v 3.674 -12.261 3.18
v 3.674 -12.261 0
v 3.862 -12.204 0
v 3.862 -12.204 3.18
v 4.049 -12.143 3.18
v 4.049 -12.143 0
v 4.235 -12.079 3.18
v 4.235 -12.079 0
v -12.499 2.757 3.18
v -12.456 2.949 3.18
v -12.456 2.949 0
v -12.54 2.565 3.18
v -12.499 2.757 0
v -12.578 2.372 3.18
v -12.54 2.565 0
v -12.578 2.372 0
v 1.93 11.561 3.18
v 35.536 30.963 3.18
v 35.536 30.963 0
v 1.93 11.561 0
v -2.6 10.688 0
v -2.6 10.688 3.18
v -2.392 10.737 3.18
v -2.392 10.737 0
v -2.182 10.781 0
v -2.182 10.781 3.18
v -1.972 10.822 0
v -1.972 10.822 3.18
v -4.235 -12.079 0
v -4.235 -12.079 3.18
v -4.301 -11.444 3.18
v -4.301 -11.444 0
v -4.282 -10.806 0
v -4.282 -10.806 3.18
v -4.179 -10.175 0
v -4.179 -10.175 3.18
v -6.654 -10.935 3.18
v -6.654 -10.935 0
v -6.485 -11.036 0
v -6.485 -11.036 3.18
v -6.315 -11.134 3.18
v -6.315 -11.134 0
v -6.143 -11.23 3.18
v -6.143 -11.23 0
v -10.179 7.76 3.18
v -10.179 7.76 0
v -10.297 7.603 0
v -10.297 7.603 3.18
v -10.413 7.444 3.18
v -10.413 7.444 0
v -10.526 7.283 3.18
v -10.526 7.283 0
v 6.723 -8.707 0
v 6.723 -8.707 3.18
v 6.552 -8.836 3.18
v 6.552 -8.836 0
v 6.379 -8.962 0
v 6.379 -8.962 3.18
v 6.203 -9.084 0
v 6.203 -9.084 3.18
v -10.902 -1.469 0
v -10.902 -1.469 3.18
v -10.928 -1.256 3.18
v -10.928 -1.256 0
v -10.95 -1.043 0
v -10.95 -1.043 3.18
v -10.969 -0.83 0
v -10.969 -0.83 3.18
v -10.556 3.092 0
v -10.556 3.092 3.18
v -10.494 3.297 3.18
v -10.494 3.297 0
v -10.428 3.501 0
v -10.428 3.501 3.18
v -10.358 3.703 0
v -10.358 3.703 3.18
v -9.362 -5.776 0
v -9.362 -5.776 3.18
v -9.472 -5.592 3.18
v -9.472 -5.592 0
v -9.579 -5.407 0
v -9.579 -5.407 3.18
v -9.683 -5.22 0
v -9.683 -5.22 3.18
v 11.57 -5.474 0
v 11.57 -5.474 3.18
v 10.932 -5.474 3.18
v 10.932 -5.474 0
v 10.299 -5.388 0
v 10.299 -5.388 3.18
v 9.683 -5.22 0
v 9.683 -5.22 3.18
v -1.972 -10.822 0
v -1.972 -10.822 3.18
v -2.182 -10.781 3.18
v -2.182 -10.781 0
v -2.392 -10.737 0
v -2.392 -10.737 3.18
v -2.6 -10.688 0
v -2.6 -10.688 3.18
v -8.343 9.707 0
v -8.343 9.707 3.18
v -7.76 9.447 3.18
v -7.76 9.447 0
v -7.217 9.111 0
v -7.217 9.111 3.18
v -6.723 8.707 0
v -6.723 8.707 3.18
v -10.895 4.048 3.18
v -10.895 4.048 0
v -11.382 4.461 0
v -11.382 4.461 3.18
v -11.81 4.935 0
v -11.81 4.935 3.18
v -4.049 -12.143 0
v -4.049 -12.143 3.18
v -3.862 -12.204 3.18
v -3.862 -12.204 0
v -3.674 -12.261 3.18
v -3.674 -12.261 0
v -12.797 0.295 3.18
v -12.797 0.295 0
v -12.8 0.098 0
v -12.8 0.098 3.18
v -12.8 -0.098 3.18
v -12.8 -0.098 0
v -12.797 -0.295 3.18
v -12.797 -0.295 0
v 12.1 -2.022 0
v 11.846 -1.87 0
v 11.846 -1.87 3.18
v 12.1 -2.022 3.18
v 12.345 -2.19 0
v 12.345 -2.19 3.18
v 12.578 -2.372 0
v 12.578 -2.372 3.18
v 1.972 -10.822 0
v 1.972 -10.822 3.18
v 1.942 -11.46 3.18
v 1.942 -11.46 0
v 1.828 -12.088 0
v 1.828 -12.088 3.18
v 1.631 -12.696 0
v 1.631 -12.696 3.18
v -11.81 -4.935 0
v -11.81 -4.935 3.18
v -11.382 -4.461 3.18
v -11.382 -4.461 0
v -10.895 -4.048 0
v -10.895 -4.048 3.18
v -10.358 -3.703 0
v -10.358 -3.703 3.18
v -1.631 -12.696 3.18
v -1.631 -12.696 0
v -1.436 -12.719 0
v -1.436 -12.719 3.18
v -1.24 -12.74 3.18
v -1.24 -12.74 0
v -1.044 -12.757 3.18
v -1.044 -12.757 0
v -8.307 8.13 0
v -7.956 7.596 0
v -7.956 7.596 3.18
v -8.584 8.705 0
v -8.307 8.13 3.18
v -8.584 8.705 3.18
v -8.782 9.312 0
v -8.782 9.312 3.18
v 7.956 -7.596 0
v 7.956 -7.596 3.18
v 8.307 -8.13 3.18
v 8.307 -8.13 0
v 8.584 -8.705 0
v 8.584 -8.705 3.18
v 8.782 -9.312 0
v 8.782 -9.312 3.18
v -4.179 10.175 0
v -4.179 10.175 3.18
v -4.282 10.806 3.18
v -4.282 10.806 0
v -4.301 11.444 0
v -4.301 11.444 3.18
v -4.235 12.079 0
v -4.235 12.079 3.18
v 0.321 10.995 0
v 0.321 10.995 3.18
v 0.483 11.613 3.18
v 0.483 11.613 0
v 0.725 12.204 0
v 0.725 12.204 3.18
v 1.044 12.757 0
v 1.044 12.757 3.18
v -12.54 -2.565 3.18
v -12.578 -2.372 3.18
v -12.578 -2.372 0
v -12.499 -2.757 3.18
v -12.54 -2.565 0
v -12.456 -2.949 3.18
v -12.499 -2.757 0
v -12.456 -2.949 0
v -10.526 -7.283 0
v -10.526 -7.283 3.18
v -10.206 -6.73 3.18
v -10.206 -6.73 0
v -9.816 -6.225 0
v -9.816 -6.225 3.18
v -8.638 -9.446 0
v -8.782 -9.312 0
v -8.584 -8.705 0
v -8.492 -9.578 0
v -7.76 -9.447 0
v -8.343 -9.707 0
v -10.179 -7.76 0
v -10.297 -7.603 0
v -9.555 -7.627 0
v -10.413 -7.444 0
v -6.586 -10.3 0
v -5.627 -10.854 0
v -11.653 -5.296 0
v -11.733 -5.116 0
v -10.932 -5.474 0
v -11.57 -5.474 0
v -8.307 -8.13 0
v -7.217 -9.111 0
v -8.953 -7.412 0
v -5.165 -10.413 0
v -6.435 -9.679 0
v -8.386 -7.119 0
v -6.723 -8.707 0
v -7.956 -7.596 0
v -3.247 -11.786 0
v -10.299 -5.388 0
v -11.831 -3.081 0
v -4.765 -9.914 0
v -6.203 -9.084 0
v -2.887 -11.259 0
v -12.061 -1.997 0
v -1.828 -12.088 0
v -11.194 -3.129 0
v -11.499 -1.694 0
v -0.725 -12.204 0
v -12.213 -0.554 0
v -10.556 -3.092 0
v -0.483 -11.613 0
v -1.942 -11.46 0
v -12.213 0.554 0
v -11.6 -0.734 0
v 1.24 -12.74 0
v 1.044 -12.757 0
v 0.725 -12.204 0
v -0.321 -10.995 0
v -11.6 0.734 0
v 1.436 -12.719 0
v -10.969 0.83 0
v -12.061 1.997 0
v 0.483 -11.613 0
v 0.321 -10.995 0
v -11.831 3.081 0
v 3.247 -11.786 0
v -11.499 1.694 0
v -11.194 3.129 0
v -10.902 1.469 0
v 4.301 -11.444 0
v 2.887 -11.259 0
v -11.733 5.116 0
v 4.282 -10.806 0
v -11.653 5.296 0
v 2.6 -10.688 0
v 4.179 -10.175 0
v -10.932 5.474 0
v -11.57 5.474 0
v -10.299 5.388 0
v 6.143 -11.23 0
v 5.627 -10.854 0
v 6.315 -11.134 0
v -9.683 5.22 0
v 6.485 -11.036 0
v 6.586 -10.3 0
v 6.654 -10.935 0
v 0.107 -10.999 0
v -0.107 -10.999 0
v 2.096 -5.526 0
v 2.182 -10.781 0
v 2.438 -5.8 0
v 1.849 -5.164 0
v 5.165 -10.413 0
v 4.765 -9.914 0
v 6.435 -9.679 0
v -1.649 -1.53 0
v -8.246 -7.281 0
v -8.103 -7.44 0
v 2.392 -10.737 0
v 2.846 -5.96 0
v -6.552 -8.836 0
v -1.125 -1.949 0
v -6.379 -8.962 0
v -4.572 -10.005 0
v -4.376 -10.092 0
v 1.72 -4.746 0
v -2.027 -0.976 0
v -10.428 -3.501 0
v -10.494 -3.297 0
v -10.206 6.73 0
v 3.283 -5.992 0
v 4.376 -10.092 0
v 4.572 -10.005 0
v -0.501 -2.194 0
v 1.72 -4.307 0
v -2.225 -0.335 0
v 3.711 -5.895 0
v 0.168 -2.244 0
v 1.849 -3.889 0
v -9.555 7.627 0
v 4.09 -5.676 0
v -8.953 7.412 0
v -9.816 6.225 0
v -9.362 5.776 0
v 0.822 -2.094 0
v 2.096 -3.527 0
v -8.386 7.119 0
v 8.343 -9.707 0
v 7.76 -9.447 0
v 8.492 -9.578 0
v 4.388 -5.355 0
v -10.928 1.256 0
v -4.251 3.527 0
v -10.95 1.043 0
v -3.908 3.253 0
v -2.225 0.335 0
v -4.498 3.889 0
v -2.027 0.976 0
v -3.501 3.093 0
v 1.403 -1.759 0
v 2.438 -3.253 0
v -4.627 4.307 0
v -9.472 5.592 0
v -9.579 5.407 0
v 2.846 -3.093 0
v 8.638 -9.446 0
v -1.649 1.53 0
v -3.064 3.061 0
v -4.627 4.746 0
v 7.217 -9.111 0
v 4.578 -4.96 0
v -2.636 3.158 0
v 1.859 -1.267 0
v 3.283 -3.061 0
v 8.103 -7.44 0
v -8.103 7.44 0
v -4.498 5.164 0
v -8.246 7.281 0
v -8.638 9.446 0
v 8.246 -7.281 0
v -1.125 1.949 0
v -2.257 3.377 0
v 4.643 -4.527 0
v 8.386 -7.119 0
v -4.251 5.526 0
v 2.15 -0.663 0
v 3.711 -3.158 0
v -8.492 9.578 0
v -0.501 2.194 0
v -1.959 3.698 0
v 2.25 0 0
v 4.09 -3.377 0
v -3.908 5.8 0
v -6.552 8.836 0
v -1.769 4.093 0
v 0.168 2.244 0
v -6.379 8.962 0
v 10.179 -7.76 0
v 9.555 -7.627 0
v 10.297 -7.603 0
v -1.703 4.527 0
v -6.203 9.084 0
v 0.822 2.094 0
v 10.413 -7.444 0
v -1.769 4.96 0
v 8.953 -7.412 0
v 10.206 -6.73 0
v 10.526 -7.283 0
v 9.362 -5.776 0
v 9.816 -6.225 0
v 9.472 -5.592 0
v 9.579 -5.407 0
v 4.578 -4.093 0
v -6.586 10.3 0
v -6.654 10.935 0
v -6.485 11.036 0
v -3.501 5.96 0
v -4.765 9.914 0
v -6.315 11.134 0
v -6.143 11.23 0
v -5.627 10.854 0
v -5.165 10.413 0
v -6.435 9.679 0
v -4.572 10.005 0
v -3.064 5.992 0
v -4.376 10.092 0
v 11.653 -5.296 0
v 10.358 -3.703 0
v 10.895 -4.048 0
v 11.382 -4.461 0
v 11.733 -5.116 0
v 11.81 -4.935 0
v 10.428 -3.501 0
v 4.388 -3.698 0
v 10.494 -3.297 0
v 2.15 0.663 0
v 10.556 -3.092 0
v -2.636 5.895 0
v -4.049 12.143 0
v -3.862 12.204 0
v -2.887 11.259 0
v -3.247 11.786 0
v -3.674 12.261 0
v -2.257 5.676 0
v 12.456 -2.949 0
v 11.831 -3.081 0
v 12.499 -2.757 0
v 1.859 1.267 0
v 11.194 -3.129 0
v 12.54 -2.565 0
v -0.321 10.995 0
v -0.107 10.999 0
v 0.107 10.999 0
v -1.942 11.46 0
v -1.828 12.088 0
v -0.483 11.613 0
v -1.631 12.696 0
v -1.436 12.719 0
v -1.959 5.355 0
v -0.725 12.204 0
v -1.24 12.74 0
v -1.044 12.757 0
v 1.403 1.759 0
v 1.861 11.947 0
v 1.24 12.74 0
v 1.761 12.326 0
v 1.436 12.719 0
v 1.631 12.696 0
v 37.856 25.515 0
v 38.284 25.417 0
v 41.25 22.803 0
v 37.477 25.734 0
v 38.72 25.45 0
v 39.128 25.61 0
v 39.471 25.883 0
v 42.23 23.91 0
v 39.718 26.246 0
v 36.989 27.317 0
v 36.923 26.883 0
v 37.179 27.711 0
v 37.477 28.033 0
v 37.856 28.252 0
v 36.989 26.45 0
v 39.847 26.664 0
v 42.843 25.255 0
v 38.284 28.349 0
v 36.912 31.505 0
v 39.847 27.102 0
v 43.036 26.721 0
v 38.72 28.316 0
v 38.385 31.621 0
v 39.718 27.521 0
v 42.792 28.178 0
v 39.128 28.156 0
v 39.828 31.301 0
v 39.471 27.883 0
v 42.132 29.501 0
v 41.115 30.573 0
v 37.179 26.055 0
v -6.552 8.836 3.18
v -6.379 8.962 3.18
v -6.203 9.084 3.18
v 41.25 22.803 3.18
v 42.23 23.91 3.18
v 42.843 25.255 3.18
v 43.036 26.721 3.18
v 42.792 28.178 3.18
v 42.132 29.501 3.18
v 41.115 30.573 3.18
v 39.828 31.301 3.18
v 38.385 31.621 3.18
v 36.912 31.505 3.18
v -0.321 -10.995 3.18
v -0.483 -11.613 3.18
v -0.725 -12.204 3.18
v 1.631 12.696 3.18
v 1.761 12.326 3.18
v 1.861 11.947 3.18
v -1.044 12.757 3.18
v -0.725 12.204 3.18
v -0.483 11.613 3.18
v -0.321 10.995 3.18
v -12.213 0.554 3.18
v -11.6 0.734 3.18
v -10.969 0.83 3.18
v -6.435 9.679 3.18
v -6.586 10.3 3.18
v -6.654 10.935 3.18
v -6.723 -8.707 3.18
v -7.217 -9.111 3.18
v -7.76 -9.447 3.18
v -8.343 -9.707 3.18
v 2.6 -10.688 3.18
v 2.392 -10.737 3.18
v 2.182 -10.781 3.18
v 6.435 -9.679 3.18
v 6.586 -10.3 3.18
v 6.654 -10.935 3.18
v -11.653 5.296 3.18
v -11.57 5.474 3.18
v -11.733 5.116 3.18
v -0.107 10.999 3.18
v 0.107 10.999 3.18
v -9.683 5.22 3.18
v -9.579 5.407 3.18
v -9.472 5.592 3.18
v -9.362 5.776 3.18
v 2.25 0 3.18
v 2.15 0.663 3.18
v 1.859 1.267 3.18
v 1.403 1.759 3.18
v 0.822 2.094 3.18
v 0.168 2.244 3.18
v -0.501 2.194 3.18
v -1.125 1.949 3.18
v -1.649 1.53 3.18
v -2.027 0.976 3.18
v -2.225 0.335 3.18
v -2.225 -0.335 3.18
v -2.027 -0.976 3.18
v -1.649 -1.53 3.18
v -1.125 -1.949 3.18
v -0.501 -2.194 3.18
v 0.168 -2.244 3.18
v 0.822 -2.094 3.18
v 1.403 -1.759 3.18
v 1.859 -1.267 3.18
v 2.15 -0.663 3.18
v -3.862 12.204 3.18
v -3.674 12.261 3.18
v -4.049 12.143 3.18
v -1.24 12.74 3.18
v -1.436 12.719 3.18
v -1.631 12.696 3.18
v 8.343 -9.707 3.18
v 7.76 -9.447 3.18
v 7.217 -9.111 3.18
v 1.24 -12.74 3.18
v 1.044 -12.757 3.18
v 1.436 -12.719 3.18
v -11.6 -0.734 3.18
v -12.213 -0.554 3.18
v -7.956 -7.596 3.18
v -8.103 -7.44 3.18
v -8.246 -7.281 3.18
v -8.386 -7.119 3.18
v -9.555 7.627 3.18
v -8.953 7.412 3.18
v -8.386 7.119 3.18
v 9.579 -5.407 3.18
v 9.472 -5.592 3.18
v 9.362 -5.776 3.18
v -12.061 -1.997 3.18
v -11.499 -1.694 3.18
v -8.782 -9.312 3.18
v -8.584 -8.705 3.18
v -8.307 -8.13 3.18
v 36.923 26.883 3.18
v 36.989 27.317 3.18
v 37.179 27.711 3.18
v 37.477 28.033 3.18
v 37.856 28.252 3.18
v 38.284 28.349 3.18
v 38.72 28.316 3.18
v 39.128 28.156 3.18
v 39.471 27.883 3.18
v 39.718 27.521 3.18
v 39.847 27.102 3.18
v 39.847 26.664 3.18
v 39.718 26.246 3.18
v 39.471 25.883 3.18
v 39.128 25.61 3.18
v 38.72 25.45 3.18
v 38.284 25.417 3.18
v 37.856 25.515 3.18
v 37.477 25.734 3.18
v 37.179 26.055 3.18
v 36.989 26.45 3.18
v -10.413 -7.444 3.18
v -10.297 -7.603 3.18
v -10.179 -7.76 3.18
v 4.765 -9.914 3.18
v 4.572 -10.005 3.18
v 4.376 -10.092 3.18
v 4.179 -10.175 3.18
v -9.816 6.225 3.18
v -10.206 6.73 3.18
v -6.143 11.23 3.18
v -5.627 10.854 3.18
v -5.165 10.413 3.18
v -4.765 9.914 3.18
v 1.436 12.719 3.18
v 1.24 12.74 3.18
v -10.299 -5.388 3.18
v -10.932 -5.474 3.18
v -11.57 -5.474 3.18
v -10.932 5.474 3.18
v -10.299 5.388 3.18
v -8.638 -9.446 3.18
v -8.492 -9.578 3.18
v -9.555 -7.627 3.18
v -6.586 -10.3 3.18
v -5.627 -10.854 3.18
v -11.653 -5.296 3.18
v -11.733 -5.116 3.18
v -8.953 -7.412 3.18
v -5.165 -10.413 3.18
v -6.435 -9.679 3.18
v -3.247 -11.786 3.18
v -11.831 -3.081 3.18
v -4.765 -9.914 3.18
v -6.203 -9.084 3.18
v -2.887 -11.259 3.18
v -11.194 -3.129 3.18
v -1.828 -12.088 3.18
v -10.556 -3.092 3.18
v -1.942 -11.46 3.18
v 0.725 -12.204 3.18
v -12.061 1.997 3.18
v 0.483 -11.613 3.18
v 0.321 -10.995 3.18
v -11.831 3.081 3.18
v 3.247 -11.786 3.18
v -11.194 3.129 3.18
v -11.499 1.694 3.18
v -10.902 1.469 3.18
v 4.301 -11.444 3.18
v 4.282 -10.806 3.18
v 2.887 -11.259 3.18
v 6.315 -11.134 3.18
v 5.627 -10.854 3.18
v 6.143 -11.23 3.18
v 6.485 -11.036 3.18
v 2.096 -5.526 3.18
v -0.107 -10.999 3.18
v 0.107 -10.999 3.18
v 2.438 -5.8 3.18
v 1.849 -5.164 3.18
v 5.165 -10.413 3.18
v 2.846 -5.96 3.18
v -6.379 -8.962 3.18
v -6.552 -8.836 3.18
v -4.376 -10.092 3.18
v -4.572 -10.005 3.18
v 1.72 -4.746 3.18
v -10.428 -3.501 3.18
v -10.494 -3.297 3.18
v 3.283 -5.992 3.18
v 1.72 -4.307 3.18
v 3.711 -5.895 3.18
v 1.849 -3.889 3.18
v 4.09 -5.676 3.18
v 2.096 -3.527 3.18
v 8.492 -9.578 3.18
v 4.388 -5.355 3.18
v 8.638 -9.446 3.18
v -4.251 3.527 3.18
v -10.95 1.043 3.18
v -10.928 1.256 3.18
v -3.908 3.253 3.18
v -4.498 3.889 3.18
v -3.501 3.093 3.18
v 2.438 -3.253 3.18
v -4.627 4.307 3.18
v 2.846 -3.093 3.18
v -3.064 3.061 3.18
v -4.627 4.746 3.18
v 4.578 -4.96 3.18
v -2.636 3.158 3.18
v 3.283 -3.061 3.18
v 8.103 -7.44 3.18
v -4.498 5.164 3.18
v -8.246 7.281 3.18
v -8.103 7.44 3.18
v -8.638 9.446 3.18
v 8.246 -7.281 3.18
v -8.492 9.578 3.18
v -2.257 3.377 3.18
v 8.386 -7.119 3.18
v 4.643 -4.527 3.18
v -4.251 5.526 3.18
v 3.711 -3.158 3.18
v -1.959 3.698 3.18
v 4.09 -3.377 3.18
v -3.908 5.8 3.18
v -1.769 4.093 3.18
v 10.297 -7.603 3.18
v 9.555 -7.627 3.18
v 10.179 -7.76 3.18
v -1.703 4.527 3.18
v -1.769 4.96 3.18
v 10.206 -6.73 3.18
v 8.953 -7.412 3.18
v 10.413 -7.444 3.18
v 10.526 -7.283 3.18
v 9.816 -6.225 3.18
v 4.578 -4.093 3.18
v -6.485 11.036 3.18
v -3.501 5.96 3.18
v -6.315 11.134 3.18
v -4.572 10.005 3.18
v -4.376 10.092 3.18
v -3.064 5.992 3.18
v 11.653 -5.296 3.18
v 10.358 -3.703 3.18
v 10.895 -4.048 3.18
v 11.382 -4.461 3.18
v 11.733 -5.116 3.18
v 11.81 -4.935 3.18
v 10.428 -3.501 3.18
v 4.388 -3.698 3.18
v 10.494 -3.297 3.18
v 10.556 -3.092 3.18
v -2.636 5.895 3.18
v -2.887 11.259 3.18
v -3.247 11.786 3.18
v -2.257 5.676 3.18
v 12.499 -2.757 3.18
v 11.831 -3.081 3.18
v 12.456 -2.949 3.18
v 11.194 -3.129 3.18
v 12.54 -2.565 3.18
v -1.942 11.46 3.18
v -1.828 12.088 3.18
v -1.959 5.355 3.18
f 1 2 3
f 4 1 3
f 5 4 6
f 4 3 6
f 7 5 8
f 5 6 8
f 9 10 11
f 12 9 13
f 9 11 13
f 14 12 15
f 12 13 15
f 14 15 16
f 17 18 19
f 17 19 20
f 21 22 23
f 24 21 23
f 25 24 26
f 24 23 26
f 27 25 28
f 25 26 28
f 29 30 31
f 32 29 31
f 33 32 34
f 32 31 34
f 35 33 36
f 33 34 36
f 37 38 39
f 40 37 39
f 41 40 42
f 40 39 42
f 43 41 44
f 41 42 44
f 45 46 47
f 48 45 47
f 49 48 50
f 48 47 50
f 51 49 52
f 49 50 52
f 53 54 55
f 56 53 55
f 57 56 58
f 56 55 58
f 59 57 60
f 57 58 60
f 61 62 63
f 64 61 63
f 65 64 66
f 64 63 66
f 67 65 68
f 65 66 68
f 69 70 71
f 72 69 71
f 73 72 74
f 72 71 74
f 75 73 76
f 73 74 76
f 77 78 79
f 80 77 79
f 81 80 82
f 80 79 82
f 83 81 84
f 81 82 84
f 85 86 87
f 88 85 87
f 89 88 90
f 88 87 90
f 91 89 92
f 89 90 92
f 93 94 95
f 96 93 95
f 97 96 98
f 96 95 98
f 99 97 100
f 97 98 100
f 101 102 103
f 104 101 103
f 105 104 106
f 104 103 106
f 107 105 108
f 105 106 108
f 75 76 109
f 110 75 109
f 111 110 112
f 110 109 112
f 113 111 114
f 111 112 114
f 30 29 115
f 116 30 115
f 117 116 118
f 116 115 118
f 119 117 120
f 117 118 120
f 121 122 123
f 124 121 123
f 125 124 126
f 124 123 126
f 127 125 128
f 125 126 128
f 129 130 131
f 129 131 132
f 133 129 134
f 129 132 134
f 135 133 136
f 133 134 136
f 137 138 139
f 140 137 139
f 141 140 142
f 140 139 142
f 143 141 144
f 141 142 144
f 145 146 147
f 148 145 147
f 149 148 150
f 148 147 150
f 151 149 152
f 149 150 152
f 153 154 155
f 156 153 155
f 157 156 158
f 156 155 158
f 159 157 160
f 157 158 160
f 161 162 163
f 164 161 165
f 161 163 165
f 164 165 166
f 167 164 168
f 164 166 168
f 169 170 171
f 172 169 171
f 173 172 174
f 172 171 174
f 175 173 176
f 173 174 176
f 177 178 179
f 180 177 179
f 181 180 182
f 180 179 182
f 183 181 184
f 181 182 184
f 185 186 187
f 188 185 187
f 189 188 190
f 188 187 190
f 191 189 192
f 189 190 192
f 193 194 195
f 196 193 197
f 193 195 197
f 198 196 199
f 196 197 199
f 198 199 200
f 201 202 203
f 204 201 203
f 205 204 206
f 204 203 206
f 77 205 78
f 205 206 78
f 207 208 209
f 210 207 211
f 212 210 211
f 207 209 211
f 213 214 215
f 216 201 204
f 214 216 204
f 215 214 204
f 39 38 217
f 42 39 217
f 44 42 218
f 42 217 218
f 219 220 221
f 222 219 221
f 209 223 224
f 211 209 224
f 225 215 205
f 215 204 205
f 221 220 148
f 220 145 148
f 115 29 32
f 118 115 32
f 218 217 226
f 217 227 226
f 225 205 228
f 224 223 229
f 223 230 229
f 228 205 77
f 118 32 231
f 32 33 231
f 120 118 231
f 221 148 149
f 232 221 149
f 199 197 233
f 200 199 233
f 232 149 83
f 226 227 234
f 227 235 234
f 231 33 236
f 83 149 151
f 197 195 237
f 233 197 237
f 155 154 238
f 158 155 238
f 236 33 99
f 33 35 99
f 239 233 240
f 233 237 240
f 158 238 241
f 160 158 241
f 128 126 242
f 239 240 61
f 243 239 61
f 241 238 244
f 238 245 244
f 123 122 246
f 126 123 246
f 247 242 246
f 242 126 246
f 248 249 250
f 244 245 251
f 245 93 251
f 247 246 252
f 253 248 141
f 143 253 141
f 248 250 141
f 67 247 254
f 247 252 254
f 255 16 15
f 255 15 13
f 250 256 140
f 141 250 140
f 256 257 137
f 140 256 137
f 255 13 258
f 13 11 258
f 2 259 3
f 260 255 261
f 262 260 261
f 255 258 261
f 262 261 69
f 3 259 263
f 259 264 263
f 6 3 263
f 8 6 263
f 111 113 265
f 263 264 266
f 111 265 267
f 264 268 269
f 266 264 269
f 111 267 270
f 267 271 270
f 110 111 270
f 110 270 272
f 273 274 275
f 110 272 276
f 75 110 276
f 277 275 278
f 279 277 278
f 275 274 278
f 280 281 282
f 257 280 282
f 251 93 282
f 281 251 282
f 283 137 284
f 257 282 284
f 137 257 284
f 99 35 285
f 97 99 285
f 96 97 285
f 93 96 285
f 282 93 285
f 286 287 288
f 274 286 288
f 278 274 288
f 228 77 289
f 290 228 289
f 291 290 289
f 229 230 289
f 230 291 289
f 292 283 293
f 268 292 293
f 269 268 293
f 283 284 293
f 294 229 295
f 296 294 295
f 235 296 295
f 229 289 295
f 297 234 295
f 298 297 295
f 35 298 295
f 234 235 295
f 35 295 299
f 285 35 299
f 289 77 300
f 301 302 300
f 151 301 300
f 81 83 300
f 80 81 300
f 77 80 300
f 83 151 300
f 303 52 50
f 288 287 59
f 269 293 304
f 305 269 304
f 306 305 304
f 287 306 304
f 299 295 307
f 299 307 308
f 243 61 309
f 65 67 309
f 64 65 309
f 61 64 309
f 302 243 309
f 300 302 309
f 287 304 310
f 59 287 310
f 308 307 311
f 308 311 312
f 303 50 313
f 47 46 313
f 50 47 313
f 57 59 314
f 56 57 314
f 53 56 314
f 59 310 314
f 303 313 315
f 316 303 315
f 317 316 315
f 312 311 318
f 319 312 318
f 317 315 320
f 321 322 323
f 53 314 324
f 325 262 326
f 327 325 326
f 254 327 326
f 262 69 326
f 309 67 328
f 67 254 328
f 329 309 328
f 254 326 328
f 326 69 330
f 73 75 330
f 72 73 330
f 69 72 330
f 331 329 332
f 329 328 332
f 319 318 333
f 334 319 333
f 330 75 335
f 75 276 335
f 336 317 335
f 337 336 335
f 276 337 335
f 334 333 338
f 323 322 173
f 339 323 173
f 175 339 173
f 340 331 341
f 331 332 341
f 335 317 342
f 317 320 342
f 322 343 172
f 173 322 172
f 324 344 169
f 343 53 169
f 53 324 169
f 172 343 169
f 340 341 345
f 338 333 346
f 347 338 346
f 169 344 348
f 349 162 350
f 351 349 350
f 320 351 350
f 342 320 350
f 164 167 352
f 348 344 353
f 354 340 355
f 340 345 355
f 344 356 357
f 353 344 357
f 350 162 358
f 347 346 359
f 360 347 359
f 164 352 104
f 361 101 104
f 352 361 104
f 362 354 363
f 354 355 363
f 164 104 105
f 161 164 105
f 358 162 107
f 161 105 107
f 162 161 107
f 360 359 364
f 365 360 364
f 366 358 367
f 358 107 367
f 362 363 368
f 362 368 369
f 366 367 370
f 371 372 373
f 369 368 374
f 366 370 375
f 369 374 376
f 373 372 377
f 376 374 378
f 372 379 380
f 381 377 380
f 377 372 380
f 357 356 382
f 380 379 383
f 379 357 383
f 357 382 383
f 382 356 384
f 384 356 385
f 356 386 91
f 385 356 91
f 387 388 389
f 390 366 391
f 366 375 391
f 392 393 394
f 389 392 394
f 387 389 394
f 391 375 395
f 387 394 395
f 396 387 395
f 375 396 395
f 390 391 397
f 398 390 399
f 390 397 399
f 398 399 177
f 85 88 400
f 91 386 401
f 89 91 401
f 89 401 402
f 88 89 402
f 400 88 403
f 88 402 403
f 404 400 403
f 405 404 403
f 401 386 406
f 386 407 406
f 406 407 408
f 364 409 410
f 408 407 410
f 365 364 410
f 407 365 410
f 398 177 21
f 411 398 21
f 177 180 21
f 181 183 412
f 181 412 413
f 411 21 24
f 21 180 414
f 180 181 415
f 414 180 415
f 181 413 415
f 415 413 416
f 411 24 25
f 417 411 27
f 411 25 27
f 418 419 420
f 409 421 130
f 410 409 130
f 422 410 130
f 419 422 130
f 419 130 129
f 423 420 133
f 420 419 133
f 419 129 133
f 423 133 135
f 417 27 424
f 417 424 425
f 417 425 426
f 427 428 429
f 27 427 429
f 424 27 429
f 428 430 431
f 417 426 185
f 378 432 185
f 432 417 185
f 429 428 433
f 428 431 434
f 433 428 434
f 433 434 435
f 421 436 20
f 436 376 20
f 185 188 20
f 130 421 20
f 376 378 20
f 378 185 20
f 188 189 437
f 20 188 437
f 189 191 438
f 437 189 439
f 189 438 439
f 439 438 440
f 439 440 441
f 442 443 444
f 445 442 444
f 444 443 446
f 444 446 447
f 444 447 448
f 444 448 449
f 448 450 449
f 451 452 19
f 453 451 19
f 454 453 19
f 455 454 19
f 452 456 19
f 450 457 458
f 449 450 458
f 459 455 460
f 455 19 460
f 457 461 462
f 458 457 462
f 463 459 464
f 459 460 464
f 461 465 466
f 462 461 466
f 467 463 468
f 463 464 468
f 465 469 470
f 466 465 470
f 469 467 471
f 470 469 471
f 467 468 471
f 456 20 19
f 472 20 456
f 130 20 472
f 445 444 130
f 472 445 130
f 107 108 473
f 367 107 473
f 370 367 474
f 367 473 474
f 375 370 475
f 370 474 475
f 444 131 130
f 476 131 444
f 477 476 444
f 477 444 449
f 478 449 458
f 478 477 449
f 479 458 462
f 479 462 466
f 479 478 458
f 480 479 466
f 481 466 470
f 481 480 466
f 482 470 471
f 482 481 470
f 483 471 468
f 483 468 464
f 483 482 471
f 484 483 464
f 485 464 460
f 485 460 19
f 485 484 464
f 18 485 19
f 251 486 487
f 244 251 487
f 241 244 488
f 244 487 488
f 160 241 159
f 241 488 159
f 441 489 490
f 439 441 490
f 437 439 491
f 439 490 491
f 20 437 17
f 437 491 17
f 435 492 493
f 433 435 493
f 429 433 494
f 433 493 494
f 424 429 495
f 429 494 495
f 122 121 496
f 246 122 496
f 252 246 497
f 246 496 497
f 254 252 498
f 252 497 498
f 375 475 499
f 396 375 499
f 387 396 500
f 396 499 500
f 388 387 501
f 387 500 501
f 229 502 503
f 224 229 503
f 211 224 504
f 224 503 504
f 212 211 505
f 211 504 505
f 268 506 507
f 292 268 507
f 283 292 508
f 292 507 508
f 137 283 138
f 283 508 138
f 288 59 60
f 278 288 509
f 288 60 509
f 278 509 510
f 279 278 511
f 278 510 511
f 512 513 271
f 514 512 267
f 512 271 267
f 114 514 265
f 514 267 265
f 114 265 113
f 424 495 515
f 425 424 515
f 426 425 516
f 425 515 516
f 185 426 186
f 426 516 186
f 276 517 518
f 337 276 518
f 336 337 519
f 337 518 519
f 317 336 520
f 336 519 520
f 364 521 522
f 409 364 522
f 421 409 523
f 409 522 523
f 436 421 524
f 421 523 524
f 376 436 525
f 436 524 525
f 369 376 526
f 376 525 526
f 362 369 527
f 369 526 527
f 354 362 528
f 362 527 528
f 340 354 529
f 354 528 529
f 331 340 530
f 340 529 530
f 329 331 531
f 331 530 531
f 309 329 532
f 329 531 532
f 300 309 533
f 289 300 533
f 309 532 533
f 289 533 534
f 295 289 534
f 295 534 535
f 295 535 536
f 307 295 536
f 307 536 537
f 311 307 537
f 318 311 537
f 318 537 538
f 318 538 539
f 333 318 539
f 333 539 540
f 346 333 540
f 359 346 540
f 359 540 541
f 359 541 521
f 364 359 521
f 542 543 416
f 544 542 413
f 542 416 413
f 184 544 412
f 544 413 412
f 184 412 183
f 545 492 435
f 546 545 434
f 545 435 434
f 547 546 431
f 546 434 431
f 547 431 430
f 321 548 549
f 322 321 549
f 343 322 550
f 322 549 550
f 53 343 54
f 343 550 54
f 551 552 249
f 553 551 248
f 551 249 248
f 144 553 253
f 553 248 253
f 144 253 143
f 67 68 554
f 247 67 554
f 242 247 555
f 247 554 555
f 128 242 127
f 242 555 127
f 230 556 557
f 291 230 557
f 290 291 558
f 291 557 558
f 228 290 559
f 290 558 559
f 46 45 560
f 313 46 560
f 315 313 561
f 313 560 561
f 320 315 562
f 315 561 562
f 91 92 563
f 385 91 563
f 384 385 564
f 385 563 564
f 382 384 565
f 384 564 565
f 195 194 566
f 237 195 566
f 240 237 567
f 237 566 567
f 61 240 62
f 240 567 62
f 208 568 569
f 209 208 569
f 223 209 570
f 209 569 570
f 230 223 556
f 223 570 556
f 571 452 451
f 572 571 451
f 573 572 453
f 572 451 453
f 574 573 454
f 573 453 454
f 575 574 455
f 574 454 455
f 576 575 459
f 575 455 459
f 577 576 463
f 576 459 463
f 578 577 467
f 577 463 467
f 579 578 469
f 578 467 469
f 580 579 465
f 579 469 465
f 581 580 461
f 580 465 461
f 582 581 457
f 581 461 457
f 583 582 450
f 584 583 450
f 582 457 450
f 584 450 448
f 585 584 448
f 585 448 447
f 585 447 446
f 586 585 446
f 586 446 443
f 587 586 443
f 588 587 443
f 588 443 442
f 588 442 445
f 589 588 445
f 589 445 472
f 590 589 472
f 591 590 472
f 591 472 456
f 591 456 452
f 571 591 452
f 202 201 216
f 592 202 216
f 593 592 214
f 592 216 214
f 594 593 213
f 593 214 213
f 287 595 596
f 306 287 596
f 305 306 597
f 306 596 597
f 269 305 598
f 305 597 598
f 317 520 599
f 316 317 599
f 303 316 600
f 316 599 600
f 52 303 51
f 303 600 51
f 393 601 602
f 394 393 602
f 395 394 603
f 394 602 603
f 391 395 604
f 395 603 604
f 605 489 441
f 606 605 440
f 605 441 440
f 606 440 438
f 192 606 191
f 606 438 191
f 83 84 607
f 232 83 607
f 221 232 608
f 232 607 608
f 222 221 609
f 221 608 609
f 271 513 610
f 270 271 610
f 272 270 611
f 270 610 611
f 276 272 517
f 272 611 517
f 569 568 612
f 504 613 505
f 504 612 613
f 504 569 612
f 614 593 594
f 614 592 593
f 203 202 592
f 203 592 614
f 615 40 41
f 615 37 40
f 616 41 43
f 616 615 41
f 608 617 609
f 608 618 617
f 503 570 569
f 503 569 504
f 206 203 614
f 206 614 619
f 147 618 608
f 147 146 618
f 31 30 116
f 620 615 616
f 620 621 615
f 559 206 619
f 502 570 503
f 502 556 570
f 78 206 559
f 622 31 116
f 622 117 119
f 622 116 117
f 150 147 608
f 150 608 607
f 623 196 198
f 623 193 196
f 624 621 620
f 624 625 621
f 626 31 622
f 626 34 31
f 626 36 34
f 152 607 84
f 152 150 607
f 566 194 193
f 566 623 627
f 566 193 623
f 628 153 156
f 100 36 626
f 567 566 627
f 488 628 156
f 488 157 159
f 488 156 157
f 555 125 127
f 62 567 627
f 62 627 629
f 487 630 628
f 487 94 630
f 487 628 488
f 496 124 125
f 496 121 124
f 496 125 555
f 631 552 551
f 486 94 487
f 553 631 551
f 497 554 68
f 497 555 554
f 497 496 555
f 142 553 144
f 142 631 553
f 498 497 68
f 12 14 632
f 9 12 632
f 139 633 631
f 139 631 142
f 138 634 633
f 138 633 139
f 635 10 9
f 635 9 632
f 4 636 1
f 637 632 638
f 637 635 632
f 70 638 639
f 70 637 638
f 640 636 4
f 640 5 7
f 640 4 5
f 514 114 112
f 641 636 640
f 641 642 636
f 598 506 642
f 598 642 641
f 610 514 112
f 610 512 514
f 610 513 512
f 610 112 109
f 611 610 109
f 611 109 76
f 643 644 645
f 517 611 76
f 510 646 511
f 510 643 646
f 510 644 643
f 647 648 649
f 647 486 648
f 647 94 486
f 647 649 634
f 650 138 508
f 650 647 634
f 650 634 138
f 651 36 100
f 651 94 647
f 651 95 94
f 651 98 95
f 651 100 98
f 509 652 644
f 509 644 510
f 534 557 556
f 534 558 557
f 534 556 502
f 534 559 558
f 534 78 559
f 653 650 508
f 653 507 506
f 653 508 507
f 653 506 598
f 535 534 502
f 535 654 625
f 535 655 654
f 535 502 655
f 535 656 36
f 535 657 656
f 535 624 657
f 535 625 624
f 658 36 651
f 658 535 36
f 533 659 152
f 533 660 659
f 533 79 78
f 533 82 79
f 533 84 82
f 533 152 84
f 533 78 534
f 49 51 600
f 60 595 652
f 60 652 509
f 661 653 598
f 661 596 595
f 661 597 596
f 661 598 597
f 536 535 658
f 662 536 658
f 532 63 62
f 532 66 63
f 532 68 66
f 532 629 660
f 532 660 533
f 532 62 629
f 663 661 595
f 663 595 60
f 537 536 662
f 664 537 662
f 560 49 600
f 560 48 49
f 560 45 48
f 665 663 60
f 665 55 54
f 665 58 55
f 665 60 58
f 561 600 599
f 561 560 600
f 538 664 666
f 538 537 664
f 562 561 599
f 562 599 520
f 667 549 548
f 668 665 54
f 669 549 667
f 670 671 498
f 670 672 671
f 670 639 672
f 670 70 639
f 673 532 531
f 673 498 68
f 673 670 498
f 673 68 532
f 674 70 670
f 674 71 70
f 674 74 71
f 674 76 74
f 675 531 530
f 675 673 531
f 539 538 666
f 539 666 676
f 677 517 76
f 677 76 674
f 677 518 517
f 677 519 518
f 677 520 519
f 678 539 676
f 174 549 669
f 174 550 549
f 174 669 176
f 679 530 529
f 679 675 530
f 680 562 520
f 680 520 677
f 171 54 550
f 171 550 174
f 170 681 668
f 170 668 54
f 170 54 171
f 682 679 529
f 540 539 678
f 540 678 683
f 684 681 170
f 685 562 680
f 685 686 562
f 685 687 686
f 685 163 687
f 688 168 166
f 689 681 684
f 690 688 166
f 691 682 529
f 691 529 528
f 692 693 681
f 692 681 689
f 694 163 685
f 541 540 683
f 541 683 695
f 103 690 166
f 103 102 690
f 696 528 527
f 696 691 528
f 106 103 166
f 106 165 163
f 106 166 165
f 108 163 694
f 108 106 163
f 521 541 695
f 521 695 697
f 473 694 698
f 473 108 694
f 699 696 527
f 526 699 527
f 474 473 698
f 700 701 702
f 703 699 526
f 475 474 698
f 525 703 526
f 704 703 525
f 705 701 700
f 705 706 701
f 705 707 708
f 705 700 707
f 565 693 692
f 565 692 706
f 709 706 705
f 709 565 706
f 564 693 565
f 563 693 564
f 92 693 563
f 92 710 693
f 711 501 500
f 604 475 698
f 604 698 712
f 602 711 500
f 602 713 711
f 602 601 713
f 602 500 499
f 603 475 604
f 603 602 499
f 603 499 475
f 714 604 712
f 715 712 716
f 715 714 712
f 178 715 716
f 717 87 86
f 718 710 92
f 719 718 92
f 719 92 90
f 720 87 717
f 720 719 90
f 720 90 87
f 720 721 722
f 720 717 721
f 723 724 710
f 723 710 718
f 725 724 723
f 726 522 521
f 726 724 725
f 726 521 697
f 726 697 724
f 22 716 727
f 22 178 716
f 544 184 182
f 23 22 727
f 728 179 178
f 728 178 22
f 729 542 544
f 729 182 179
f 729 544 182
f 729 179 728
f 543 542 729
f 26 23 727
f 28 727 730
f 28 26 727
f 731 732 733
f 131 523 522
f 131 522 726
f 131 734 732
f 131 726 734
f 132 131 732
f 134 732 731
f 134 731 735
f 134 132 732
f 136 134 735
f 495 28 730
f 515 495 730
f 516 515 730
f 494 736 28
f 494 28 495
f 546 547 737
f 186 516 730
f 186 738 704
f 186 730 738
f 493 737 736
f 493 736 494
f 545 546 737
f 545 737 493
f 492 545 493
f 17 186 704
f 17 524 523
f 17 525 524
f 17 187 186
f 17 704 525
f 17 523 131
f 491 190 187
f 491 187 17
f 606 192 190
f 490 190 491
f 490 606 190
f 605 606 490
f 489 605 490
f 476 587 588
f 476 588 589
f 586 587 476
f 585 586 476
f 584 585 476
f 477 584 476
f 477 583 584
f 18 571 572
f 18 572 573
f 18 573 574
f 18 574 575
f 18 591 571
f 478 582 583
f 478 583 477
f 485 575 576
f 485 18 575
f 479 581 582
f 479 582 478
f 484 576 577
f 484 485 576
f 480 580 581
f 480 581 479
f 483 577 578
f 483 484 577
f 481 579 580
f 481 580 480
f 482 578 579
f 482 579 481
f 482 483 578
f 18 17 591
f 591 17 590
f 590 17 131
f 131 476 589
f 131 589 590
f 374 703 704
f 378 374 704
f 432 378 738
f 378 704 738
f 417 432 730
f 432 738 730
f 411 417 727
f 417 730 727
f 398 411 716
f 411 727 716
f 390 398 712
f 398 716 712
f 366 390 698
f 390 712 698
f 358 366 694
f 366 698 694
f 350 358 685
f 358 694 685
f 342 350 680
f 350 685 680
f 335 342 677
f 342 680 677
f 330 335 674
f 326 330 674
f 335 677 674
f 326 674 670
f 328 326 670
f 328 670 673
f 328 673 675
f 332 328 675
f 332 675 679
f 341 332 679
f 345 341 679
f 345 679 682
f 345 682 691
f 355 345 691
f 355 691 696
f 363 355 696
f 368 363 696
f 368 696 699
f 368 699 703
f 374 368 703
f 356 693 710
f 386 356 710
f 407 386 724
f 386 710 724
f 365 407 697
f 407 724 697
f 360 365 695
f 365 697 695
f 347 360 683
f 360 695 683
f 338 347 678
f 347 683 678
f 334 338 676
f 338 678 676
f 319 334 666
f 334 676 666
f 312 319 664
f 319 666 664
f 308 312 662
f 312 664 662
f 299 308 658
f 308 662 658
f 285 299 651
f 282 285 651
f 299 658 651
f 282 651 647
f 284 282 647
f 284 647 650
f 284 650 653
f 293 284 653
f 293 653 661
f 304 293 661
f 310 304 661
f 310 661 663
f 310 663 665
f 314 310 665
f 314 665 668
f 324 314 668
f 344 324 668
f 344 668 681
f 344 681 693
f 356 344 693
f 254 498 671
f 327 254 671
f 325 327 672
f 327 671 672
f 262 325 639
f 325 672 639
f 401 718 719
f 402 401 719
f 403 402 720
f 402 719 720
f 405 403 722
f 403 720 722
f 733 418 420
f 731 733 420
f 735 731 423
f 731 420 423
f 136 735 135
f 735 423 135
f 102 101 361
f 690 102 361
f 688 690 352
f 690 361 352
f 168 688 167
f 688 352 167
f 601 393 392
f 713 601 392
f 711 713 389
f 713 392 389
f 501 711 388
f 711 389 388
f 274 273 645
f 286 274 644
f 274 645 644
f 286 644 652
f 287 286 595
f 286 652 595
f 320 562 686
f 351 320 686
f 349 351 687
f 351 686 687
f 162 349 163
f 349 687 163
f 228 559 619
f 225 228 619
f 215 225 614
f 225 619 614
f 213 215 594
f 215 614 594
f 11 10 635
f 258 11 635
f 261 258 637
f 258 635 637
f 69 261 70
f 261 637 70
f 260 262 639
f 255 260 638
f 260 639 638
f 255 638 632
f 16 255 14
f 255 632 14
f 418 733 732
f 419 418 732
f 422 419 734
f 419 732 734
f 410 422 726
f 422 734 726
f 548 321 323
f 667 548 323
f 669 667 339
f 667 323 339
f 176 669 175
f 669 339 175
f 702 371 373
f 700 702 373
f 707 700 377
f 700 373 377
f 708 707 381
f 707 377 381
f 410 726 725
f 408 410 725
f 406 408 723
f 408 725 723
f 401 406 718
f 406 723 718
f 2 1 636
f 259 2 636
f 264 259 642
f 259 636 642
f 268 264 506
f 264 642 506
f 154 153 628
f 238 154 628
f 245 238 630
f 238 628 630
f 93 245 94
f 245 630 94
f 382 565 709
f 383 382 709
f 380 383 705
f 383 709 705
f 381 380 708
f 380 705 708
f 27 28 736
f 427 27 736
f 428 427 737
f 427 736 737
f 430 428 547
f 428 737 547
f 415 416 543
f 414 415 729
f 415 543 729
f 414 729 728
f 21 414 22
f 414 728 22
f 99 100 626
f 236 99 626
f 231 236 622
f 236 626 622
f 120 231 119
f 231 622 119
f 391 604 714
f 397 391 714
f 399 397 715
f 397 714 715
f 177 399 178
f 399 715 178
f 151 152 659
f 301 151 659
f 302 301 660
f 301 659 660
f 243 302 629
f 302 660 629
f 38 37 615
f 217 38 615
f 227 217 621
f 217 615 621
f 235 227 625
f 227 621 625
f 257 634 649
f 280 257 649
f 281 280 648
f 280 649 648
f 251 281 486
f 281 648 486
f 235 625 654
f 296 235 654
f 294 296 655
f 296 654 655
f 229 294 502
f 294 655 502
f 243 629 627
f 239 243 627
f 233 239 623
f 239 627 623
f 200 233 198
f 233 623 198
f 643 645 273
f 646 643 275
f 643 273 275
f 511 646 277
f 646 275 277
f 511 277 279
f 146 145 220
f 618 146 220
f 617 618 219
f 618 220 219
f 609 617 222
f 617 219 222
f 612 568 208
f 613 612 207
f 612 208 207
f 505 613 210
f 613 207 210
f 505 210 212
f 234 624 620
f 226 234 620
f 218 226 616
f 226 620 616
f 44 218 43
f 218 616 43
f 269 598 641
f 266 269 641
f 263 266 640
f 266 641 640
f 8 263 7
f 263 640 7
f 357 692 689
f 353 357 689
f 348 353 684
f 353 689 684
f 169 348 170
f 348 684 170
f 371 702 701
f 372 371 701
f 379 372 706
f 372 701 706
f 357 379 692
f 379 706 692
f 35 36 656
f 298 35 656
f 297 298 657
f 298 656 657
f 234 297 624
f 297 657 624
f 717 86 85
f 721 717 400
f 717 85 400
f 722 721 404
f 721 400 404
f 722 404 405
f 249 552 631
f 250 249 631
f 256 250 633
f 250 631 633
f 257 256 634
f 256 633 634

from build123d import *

# Parameters (mm, degrees)
SKETCH1_R           = 12.8
BOSS_EXTRUDE1_DEPTH = 3.18
CUT_EXTRUDE1_DEPTH  = 19.379129468
CIRPATTERN1_COUNT   = 30
SKETCH4_R           = 2.25
CUT_EXTRUDE3_DEPTH  = 19.349437359
BOSS_EXTRUDE6_START = -3.18
BOSS_EXTRUDE6_DEPTH = 3.18
SKETCH8_R           = 1.47
CUT_EXTRUDE4_DEPTH  = 54.506204937
SKETCH9_R           = 1.47
CUT_EXTRUDE5_DEPTH  = 54.506204937


with BuildPart() as part:
    # Sketch1 → Boss-Extrude1 (new body)
    with BuildSketch(Plane.XY):
        with Locations(Location((0, 0, 0), (0, 0, 180))):
            Circle(SKETCH1_R)
    extrude(amount=BOSS_EXTRUDE1_DEPTH)

    # Sketch2 → Cut-Extrude1 (cut, through all)
    with BuildSketch(Plane.XY.offset(3.18)):
        with BuildLine():
            ThreePointArc((-0.321034752, 10.995314306), (0, 11), (0.321034752, 10.995314306))
            ThreePointArc((0.321034752, 10.995314306), (0.594388904, 11.912556329), (1.044293354, 12.75732932))
            ThreePointArc((1.044293354, 12.75732932), (0, 12.8), (-1.044293354, 12.75732932))
            ThreePointArc((-1.044293354, 12.75732932), (-0.594388904, 11.912556329), (-0.321034752, 10.995314306))
        make_face()
    cut_extrude1 = extrude(amount=-CUT_EXTRUDE1_DEPTH, mode=Mode.SUBTRACT)

    # CirPattern1: Cut-Extrude1 ×30 about axis
    cirpattern1_axis = Axis((0, 0, 0), (0, 0, 1))
    for i in range(1, CIRPATTERN1_COUNT):
        add(cut_extrude1.rotate(cirpattern1_axis, i * 360 / CIRPATTERN1_COUNT), mode=Mode.SUBTRACT)

    # Sketch4 → Cut-Extrude3 (cut, through all)
    with BuildSketch(Plane.XY.offset(3.18)):
        Circle(SKETCH4_R)
    extrude(amount=-CUT_EXTRUDE3_DEPTH, mode=Mode.SUBTRACT)

    # Sketch6 → Boss-Extrude6 (add)
    with BuildSketch(Plane(origin=(0, 0, 0), x_dir=(-1, 0, 0), z_dir=(0, 0, -1)).offset(BOSS_EXTRUDE6_START)):
        with BuildLine():
            Line((-35.536396094, 30.96349829), (-0.895379942, 10.96349829))
            ThreePointArc((-0.895379942, 10.96349829), (-9.010672487, 6.3093408), (-10.608556418, -2.908355332))
            Line((-10.608556418, -2.908355332), (-41.250334142, 22.803149056))
            ThreePointArc((-41.250334142, 22.803149056), (-42.132156315, 29.501253453), (-35.536396094, 30.96349829))
        make_face()
    extrude(amount=BOSS_EXTRUDE6_DEPTH)

    # Sketch8 → Cut-Extrude4 (cut, through all)
    with BuildSketch(Plane.XY.offset(3.18)):
        with Locations((-3.173453683, 4.526502263)):
            Circle(SKETCH8_R)
        with Locations((3.173453683, -4.526502263)):
            Circle(SKETCH8_R)
    extrude(amount=-CUT_EXTRUDE4_DEPTH, mode=Mode.SUBTRACT)

    # Sketch9 → Cut-Extrude5 (cut, through all)
    with BuildSketch(Plane(origin=(0, 0, 0), x_dir=(-1, 0, 0), z_dir=(0, 0, -1))):
        with Locations((-38.393365118, 26.883323673)):
            Circle(SKETCH9_R)
    extrude(amount=-CUT_EXTRUDE5_DEPTH, mode=Mode.SUBTRACT)


solid = part.part
